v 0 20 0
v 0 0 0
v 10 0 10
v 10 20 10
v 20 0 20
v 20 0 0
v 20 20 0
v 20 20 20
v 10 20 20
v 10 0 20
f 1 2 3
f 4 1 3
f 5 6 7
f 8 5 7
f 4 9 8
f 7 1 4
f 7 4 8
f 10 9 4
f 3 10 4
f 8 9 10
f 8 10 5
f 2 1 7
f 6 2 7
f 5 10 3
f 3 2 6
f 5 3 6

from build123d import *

# Parameters (mm, degrees)
SKETCH1_W           = 20
SKETCH1_H           = 20
BOSS_EXTRUDE1_DEPTH = 20
SKETCH2_W           = 10
SKETCH2_H           = 10
CUT_EXTRUDE1_DEPTH  = 20
CUT_EXTRUDE2_DEPTH  = 20


with BuildPart() as part:
    # Sketch1 → Boss-Extrude1 (new body)
    with BuildSketch(Plane.XY):
        with Locations((10, 10)):
            Rectangle(SKETCH1_W, SKETCH1_H)
    extrude(amount=BOSS_EXTRUDE1_DEPTH)

    # Sketch2 → Cut-Extrude1 (cut)
    with BuildSketch(Plane(origin=(0, 20, 0), x_dir=(1, 0, 0), z_dir=(0, 1, 0))):
        with Locations((5, -15)):
            Rectangle(SKETCH2_W, SKETCH2_H)
    extrude(amount=-CUT_EXTRUDE1_DEPTH, mode=Mode.SUBTRACT)

    # Sketch3 → Cut-Extrude2 (cut)
    with BuildSketch(Plane(origin=(0, 20, 0), x_dir=(1, 0, 0), z_dir=(0, 1, 0))):
        Polygon((0, 0), (10, -10), (0, -10), align=None)
    extrude(amount=-CUT_EXTRUDE2_DEPTH, mode=Mode.SUBTRACT)


solid = part.part
